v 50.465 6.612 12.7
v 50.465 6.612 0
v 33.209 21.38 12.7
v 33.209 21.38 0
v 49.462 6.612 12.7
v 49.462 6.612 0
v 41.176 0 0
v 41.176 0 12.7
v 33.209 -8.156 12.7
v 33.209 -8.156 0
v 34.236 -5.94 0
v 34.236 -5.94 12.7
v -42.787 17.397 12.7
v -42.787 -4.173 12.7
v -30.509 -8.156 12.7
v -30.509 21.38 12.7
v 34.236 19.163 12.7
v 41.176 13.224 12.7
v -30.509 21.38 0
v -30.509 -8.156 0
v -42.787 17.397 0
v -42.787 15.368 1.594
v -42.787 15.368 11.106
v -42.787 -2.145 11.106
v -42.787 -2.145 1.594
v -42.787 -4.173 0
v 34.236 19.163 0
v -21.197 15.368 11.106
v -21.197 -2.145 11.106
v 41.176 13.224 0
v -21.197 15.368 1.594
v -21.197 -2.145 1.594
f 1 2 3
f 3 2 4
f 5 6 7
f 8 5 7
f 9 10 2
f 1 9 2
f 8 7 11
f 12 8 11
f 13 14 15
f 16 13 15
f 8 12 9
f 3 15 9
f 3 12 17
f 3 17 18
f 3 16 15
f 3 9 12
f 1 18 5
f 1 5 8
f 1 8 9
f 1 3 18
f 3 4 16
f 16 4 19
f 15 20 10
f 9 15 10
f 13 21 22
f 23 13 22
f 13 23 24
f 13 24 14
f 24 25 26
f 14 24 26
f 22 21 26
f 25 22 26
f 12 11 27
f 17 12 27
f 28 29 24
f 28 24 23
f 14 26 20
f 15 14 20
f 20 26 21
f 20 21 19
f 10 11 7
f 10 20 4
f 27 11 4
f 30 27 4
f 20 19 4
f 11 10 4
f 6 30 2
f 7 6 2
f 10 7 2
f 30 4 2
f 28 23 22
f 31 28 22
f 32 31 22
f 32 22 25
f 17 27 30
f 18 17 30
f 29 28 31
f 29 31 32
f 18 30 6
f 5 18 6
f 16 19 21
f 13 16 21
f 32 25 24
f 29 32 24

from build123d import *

# Parameters (mm, degrees)
F1_DEPTH = 12.7
F3_DEPTH = 21.59


with BuildPart() as f1:
    # F0 (on Top) → F1 (new body)
    with BuildSketch(Plane.XY):
        Polygon((33.208514, -8.155814), (33.208514, 21.379727), (-30.508613, 21.379727), (-42.787436, 17.397408), (-42.787436, -4.173495), (-30.508613, -8.155814), align=None)
        Polygon((33.208514, -8.155814), (50.465232, 6.611957), (33.208514, 21.379727), align=None)
        Polygon((49.4617, 6.611957), (41.17628, 0), (34.235716, -5.939522), (34.235716, 6.611957), (34.235716, 19.163436), (41.17628, 13.223914), align=None, mode=Mode.SUBTRACT)
    extrude(amount=F1_DEPTH)

    # F2 (on face) → F3 (cut)
    with BuildSketch(Plane(origin=(-42.787436, 0, 0), x_dir=(0, -1, 0), z_dir=(-1, 0, 0))):
        Polygon((-15.368456, 11.105623), (-15.368456, 6.35), (-15.368456, 1.594377), (2.144542, 1.594377), (2.144542, 6.35), (2.144542, 11.105623), align=None)
    extrude(amount=-F3_DEPTH, mode=Mode.SUBTRACT)


solid = f1.part
